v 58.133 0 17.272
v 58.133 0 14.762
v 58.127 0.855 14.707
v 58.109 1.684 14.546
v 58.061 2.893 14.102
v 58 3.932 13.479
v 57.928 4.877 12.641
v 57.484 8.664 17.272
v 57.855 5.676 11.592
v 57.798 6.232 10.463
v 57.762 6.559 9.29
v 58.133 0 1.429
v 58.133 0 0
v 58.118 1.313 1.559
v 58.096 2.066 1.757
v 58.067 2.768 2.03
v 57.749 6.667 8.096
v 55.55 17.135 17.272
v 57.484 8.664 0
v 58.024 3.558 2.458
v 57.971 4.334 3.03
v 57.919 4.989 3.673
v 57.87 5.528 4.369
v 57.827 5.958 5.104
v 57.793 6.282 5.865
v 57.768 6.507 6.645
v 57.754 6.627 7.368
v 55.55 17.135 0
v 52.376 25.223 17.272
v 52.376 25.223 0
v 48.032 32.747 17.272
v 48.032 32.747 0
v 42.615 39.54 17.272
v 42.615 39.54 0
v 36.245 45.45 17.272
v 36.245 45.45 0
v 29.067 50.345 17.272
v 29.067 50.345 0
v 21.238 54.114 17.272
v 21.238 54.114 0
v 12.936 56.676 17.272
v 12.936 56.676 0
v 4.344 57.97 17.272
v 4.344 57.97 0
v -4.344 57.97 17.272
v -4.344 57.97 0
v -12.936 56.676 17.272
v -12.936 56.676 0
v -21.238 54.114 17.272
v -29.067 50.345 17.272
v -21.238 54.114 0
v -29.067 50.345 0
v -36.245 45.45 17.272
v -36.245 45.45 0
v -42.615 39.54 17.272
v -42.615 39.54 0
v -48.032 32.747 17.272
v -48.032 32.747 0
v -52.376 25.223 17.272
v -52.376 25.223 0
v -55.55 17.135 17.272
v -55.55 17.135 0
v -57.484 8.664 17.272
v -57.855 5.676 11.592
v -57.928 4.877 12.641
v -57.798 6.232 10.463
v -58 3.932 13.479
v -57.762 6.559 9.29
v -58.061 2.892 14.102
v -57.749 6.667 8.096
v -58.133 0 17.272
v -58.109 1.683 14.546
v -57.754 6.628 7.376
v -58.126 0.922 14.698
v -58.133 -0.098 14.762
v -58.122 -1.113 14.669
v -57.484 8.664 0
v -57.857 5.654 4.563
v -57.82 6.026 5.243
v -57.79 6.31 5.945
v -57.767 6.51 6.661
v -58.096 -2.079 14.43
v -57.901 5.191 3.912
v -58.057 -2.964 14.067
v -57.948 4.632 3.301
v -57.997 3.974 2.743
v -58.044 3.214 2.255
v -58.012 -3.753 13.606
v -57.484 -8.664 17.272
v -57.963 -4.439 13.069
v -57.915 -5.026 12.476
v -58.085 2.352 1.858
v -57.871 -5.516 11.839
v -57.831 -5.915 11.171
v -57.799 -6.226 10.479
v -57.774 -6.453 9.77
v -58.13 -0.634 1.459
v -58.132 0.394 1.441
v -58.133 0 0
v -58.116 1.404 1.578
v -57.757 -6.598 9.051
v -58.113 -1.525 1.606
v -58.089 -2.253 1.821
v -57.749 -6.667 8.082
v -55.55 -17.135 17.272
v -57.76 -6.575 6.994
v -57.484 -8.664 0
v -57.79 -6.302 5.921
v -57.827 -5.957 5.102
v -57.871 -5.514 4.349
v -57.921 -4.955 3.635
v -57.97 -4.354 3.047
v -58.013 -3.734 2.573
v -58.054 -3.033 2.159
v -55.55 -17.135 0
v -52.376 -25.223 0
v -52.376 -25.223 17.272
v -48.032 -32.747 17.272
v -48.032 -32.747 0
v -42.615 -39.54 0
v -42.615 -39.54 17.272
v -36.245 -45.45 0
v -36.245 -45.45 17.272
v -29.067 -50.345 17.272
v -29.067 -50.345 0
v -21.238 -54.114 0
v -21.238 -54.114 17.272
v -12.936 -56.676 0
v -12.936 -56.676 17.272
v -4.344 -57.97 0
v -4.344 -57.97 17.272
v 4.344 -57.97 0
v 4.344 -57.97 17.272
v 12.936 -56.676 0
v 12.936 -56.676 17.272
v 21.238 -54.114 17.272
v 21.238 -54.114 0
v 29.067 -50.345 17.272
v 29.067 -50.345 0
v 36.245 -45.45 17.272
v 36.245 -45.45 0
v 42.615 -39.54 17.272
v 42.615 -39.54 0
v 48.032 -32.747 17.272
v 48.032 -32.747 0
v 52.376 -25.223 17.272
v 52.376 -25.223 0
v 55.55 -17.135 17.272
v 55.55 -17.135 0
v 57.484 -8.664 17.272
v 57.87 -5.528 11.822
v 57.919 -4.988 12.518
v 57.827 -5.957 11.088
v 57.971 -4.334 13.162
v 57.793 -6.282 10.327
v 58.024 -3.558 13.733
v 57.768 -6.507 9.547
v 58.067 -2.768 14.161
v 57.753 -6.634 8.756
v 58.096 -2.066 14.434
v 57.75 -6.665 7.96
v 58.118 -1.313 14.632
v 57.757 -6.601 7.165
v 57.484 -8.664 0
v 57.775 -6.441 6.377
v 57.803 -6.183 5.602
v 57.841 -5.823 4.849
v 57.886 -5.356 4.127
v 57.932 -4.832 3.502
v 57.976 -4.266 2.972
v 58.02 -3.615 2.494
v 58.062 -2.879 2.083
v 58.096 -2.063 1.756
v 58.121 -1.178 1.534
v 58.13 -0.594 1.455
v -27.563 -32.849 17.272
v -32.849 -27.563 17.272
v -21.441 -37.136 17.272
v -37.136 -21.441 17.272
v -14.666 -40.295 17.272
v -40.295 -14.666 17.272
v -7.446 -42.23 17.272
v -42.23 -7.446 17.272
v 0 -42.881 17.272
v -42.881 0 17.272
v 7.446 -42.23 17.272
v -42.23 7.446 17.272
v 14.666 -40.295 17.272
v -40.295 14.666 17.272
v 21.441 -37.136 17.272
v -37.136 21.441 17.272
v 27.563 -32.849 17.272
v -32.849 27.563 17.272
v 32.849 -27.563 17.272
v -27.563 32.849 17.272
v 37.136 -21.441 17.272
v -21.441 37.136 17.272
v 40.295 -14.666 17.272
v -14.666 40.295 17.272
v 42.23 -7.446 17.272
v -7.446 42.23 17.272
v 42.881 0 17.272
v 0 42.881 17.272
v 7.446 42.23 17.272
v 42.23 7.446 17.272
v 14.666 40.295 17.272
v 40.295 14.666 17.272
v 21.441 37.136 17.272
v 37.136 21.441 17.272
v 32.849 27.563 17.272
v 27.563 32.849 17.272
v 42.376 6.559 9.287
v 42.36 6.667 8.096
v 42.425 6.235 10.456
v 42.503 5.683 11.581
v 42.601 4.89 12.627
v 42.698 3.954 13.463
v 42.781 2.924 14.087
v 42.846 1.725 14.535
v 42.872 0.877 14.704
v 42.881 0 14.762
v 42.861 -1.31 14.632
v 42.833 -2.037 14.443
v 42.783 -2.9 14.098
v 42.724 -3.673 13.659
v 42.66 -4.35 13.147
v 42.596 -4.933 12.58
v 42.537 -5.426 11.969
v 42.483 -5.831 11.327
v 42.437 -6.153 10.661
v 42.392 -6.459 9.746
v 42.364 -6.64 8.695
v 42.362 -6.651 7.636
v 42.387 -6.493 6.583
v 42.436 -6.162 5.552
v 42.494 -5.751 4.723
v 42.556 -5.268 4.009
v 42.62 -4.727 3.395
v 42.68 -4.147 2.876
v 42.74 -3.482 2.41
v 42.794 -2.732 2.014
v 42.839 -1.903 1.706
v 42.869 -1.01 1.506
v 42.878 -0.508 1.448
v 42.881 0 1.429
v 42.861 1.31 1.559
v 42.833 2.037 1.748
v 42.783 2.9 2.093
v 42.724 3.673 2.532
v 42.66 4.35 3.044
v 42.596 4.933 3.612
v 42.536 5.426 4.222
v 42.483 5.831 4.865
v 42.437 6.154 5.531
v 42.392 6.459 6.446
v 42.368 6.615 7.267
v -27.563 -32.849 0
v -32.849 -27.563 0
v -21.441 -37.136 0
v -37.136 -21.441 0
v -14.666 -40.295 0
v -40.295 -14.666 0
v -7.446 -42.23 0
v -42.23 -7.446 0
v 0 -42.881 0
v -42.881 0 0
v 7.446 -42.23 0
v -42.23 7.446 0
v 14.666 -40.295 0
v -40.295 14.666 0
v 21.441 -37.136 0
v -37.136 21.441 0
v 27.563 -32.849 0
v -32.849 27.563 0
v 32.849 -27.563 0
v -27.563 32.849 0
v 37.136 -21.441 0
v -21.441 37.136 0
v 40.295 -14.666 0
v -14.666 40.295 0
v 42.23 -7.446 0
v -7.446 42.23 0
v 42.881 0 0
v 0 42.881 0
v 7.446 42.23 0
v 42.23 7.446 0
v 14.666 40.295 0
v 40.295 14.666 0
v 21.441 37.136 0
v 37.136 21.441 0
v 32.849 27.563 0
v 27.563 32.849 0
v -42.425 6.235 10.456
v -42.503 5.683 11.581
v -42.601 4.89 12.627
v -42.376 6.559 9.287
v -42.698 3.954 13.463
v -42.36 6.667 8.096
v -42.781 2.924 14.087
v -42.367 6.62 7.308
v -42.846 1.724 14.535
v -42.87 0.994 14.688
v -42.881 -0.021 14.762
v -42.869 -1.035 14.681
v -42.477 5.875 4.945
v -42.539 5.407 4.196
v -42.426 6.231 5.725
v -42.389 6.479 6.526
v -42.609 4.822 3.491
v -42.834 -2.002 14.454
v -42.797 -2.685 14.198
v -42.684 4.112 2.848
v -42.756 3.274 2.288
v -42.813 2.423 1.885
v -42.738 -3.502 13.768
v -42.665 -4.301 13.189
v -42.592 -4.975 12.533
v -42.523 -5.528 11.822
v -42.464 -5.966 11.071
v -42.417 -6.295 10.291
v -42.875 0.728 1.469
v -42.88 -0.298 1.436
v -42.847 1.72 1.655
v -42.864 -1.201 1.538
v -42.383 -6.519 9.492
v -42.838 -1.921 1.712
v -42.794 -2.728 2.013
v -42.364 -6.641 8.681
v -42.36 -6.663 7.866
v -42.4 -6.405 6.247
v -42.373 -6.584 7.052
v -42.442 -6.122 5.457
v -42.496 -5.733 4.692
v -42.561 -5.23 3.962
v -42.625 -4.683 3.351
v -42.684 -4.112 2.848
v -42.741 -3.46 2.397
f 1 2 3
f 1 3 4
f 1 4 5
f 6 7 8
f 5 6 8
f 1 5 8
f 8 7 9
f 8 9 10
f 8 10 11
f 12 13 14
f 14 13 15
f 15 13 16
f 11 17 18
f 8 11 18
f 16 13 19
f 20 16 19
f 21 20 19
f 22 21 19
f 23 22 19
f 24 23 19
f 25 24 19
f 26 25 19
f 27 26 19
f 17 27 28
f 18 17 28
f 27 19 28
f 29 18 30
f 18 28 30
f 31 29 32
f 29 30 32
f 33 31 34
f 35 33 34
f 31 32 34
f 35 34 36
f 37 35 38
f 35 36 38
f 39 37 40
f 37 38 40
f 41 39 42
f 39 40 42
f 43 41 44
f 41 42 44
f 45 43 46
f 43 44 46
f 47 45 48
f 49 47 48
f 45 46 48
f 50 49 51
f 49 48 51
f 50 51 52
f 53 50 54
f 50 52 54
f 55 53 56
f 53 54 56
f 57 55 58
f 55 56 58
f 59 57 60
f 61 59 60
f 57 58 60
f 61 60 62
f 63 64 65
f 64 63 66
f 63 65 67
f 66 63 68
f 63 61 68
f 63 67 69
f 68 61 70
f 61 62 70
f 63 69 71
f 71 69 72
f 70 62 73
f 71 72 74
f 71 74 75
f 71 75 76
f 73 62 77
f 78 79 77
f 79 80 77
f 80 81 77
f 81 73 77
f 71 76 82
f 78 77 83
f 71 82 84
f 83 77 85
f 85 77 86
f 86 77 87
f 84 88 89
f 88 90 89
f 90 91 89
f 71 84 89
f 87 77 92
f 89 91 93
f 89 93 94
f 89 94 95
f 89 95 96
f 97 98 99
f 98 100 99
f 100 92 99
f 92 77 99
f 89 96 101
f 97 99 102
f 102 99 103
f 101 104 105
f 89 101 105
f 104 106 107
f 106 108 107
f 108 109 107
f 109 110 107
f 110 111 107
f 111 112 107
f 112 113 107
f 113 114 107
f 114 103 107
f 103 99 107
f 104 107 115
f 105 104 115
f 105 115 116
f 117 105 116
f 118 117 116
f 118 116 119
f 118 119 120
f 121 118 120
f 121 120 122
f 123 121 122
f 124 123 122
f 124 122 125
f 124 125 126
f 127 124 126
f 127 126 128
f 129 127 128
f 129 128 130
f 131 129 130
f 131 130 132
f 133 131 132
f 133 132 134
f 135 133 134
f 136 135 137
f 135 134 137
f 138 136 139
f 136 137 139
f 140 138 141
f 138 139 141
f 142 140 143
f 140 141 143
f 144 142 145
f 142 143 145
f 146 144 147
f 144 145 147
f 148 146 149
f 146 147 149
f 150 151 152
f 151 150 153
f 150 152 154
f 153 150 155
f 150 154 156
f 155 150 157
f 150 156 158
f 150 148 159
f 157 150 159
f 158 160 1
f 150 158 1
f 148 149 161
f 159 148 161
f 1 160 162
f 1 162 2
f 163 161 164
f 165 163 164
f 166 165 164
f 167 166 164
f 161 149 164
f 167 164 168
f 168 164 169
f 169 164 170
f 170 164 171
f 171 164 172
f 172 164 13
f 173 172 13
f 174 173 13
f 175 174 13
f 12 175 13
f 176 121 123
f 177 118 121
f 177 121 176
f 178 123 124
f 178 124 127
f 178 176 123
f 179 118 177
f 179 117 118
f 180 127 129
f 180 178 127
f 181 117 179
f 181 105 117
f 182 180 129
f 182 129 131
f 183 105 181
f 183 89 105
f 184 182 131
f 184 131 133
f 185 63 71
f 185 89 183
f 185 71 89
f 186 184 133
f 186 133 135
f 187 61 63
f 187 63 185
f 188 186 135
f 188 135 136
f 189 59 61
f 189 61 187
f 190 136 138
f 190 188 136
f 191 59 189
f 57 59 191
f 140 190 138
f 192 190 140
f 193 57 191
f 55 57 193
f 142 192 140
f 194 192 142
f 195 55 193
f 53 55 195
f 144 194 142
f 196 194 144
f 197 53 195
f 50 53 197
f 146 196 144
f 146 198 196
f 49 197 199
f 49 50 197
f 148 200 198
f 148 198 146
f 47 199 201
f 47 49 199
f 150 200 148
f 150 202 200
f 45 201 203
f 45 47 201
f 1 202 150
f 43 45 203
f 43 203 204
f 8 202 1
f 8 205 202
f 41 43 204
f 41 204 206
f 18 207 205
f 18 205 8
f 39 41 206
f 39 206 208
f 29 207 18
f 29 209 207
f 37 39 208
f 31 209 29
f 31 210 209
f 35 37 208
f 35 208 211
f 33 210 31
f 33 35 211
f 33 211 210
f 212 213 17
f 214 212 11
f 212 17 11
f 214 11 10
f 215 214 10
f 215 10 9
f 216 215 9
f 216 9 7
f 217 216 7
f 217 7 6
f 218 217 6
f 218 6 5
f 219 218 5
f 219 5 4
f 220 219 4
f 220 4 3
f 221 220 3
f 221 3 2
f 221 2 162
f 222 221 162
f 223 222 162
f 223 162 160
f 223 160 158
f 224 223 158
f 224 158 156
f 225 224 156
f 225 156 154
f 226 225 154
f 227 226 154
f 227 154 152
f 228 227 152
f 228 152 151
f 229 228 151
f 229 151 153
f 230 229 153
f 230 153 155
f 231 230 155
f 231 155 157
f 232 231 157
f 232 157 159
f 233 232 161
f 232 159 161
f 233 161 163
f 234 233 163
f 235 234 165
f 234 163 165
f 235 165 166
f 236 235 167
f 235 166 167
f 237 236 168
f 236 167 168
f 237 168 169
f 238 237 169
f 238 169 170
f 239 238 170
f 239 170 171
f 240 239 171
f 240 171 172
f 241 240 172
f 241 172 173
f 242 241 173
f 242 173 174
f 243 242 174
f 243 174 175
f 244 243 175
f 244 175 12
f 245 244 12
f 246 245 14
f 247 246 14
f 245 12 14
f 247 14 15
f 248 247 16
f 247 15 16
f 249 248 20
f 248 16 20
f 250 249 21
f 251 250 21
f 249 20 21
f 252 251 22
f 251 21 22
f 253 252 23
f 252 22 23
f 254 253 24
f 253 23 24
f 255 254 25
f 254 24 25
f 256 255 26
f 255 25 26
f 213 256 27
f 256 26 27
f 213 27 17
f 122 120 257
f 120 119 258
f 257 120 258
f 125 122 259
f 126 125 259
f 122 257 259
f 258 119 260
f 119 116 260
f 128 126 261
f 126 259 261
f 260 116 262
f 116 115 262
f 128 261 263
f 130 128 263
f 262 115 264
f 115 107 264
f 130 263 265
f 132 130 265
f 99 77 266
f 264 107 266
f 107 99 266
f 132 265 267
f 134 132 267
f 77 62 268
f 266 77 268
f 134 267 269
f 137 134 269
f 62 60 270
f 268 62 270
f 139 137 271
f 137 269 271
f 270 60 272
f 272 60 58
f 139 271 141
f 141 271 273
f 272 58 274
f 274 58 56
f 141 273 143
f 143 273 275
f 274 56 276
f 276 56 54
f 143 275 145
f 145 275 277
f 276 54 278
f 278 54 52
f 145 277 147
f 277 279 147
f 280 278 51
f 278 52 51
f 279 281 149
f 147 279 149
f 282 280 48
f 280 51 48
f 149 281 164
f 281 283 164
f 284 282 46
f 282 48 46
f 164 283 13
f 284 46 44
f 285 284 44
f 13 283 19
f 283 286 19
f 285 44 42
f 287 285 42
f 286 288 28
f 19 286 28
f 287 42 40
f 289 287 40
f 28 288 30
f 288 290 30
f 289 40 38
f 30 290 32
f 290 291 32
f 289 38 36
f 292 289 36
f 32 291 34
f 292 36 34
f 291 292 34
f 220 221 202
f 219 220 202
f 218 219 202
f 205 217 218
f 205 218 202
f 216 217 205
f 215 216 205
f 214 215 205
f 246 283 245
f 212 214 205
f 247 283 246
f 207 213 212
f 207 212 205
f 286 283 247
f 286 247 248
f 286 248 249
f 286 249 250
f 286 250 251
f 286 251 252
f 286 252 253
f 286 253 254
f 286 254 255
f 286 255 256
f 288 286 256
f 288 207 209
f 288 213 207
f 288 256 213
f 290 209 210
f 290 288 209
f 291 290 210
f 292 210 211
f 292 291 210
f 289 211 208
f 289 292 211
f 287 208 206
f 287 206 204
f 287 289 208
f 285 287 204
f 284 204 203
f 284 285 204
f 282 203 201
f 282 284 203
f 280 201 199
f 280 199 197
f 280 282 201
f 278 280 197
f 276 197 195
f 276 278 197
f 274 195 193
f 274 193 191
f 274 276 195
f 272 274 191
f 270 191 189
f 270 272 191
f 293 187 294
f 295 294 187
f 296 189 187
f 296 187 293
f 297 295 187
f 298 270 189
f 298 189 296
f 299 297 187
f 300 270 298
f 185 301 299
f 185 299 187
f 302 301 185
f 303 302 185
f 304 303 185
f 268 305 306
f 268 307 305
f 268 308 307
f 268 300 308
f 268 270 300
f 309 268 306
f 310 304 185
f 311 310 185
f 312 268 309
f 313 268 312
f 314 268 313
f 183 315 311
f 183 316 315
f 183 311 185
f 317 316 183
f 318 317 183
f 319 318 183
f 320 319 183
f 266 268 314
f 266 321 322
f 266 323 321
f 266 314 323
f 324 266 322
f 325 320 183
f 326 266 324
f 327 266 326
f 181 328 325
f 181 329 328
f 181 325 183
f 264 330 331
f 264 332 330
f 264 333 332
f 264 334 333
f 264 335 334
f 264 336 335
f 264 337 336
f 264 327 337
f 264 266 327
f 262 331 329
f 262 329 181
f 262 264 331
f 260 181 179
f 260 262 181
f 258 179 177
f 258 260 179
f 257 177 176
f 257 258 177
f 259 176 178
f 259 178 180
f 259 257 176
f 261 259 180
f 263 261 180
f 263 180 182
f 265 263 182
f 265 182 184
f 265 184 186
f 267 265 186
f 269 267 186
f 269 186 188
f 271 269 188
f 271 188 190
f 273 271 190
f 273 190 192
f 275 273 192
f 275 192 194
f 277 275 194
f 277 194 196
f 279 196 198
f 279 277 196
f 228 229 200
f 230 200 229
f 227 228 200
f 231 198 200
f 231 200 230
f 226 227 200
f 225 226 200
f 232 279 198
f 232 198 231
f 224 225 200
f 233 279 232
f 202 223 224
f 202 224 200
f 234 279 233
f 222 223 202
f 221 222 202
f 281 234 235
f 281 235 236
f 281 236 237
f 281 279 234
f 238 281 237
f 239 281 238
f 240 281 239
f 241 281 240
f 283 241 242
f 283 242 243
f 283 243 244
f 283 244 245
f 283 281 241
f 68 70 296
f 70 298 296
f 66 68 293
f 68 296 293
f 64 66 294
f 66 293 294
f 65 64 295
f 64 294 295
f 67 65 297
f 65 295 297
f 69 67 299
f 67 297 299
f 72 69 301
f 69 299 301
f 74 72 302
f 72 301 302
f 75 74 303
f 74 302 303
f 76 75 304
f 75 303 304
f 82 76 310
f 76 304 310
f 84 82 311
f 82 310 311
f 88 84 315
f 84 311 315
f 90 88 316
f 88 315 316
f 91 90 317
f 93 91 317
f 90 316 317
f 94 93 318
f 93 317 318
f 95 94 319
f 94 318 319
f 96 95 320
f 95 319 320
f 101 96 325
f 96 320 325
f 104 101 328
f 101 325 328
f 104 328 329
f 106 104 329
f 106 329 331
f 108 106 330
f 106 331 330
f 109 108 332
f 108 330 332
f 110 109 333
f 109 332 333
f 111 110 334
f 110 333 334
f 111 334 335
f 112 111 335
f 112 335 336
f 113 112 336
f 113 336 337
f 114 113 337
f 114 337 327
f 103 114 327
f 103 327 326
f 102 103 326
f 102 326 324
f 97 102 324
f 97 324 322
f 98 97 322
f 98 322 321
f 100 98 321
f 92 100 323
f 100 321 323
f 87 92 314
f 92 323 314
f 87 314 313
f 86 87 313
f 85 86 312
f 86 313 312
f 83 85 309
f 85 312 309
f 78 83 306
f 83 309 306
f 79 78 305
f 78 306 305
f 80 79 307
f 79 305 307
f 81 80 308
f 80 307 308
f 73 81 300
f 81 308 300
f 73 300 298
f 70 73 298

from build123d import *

# Parameters (mm, degrees)
F0_R     = 58.133017
F0_R_2   = 42.881141
F1_DEPTH = 17.272
F2_R     = 6.029186
F3_DEPTH = 121.92
F4_R     = 6.666666
F5_DEPTH = 81.788


with BuildPart() as f1:
    # F0 (on Top) → F1 (new body)
    with BuildSketch(Plane.XY):
        Circle(F0_R)
        Circle(F0_R_2, mode=Mode.SUBTRACT)
    extrude(amount=F1_DEPTH)

    # F2 (on Right) → F3 (cut)
    with BuildSketch(Plane.YZ):
        with Locations((0, 8.339126)):
            Circle(F2_R)
    extrude(amount=F3_DEPTH, mode=Mode.SUBTRACT)

    # F4 (on Right) → F5 (cut, symmetric)
    with BuildSketch(Plane.YZ):
        with Locations((0, 8.09556)):
            Circle(F4_R)
    extrude(amount=F5_DEPTH, both=True, mode=Mode.SUBTRACT)


solid = f1.part
